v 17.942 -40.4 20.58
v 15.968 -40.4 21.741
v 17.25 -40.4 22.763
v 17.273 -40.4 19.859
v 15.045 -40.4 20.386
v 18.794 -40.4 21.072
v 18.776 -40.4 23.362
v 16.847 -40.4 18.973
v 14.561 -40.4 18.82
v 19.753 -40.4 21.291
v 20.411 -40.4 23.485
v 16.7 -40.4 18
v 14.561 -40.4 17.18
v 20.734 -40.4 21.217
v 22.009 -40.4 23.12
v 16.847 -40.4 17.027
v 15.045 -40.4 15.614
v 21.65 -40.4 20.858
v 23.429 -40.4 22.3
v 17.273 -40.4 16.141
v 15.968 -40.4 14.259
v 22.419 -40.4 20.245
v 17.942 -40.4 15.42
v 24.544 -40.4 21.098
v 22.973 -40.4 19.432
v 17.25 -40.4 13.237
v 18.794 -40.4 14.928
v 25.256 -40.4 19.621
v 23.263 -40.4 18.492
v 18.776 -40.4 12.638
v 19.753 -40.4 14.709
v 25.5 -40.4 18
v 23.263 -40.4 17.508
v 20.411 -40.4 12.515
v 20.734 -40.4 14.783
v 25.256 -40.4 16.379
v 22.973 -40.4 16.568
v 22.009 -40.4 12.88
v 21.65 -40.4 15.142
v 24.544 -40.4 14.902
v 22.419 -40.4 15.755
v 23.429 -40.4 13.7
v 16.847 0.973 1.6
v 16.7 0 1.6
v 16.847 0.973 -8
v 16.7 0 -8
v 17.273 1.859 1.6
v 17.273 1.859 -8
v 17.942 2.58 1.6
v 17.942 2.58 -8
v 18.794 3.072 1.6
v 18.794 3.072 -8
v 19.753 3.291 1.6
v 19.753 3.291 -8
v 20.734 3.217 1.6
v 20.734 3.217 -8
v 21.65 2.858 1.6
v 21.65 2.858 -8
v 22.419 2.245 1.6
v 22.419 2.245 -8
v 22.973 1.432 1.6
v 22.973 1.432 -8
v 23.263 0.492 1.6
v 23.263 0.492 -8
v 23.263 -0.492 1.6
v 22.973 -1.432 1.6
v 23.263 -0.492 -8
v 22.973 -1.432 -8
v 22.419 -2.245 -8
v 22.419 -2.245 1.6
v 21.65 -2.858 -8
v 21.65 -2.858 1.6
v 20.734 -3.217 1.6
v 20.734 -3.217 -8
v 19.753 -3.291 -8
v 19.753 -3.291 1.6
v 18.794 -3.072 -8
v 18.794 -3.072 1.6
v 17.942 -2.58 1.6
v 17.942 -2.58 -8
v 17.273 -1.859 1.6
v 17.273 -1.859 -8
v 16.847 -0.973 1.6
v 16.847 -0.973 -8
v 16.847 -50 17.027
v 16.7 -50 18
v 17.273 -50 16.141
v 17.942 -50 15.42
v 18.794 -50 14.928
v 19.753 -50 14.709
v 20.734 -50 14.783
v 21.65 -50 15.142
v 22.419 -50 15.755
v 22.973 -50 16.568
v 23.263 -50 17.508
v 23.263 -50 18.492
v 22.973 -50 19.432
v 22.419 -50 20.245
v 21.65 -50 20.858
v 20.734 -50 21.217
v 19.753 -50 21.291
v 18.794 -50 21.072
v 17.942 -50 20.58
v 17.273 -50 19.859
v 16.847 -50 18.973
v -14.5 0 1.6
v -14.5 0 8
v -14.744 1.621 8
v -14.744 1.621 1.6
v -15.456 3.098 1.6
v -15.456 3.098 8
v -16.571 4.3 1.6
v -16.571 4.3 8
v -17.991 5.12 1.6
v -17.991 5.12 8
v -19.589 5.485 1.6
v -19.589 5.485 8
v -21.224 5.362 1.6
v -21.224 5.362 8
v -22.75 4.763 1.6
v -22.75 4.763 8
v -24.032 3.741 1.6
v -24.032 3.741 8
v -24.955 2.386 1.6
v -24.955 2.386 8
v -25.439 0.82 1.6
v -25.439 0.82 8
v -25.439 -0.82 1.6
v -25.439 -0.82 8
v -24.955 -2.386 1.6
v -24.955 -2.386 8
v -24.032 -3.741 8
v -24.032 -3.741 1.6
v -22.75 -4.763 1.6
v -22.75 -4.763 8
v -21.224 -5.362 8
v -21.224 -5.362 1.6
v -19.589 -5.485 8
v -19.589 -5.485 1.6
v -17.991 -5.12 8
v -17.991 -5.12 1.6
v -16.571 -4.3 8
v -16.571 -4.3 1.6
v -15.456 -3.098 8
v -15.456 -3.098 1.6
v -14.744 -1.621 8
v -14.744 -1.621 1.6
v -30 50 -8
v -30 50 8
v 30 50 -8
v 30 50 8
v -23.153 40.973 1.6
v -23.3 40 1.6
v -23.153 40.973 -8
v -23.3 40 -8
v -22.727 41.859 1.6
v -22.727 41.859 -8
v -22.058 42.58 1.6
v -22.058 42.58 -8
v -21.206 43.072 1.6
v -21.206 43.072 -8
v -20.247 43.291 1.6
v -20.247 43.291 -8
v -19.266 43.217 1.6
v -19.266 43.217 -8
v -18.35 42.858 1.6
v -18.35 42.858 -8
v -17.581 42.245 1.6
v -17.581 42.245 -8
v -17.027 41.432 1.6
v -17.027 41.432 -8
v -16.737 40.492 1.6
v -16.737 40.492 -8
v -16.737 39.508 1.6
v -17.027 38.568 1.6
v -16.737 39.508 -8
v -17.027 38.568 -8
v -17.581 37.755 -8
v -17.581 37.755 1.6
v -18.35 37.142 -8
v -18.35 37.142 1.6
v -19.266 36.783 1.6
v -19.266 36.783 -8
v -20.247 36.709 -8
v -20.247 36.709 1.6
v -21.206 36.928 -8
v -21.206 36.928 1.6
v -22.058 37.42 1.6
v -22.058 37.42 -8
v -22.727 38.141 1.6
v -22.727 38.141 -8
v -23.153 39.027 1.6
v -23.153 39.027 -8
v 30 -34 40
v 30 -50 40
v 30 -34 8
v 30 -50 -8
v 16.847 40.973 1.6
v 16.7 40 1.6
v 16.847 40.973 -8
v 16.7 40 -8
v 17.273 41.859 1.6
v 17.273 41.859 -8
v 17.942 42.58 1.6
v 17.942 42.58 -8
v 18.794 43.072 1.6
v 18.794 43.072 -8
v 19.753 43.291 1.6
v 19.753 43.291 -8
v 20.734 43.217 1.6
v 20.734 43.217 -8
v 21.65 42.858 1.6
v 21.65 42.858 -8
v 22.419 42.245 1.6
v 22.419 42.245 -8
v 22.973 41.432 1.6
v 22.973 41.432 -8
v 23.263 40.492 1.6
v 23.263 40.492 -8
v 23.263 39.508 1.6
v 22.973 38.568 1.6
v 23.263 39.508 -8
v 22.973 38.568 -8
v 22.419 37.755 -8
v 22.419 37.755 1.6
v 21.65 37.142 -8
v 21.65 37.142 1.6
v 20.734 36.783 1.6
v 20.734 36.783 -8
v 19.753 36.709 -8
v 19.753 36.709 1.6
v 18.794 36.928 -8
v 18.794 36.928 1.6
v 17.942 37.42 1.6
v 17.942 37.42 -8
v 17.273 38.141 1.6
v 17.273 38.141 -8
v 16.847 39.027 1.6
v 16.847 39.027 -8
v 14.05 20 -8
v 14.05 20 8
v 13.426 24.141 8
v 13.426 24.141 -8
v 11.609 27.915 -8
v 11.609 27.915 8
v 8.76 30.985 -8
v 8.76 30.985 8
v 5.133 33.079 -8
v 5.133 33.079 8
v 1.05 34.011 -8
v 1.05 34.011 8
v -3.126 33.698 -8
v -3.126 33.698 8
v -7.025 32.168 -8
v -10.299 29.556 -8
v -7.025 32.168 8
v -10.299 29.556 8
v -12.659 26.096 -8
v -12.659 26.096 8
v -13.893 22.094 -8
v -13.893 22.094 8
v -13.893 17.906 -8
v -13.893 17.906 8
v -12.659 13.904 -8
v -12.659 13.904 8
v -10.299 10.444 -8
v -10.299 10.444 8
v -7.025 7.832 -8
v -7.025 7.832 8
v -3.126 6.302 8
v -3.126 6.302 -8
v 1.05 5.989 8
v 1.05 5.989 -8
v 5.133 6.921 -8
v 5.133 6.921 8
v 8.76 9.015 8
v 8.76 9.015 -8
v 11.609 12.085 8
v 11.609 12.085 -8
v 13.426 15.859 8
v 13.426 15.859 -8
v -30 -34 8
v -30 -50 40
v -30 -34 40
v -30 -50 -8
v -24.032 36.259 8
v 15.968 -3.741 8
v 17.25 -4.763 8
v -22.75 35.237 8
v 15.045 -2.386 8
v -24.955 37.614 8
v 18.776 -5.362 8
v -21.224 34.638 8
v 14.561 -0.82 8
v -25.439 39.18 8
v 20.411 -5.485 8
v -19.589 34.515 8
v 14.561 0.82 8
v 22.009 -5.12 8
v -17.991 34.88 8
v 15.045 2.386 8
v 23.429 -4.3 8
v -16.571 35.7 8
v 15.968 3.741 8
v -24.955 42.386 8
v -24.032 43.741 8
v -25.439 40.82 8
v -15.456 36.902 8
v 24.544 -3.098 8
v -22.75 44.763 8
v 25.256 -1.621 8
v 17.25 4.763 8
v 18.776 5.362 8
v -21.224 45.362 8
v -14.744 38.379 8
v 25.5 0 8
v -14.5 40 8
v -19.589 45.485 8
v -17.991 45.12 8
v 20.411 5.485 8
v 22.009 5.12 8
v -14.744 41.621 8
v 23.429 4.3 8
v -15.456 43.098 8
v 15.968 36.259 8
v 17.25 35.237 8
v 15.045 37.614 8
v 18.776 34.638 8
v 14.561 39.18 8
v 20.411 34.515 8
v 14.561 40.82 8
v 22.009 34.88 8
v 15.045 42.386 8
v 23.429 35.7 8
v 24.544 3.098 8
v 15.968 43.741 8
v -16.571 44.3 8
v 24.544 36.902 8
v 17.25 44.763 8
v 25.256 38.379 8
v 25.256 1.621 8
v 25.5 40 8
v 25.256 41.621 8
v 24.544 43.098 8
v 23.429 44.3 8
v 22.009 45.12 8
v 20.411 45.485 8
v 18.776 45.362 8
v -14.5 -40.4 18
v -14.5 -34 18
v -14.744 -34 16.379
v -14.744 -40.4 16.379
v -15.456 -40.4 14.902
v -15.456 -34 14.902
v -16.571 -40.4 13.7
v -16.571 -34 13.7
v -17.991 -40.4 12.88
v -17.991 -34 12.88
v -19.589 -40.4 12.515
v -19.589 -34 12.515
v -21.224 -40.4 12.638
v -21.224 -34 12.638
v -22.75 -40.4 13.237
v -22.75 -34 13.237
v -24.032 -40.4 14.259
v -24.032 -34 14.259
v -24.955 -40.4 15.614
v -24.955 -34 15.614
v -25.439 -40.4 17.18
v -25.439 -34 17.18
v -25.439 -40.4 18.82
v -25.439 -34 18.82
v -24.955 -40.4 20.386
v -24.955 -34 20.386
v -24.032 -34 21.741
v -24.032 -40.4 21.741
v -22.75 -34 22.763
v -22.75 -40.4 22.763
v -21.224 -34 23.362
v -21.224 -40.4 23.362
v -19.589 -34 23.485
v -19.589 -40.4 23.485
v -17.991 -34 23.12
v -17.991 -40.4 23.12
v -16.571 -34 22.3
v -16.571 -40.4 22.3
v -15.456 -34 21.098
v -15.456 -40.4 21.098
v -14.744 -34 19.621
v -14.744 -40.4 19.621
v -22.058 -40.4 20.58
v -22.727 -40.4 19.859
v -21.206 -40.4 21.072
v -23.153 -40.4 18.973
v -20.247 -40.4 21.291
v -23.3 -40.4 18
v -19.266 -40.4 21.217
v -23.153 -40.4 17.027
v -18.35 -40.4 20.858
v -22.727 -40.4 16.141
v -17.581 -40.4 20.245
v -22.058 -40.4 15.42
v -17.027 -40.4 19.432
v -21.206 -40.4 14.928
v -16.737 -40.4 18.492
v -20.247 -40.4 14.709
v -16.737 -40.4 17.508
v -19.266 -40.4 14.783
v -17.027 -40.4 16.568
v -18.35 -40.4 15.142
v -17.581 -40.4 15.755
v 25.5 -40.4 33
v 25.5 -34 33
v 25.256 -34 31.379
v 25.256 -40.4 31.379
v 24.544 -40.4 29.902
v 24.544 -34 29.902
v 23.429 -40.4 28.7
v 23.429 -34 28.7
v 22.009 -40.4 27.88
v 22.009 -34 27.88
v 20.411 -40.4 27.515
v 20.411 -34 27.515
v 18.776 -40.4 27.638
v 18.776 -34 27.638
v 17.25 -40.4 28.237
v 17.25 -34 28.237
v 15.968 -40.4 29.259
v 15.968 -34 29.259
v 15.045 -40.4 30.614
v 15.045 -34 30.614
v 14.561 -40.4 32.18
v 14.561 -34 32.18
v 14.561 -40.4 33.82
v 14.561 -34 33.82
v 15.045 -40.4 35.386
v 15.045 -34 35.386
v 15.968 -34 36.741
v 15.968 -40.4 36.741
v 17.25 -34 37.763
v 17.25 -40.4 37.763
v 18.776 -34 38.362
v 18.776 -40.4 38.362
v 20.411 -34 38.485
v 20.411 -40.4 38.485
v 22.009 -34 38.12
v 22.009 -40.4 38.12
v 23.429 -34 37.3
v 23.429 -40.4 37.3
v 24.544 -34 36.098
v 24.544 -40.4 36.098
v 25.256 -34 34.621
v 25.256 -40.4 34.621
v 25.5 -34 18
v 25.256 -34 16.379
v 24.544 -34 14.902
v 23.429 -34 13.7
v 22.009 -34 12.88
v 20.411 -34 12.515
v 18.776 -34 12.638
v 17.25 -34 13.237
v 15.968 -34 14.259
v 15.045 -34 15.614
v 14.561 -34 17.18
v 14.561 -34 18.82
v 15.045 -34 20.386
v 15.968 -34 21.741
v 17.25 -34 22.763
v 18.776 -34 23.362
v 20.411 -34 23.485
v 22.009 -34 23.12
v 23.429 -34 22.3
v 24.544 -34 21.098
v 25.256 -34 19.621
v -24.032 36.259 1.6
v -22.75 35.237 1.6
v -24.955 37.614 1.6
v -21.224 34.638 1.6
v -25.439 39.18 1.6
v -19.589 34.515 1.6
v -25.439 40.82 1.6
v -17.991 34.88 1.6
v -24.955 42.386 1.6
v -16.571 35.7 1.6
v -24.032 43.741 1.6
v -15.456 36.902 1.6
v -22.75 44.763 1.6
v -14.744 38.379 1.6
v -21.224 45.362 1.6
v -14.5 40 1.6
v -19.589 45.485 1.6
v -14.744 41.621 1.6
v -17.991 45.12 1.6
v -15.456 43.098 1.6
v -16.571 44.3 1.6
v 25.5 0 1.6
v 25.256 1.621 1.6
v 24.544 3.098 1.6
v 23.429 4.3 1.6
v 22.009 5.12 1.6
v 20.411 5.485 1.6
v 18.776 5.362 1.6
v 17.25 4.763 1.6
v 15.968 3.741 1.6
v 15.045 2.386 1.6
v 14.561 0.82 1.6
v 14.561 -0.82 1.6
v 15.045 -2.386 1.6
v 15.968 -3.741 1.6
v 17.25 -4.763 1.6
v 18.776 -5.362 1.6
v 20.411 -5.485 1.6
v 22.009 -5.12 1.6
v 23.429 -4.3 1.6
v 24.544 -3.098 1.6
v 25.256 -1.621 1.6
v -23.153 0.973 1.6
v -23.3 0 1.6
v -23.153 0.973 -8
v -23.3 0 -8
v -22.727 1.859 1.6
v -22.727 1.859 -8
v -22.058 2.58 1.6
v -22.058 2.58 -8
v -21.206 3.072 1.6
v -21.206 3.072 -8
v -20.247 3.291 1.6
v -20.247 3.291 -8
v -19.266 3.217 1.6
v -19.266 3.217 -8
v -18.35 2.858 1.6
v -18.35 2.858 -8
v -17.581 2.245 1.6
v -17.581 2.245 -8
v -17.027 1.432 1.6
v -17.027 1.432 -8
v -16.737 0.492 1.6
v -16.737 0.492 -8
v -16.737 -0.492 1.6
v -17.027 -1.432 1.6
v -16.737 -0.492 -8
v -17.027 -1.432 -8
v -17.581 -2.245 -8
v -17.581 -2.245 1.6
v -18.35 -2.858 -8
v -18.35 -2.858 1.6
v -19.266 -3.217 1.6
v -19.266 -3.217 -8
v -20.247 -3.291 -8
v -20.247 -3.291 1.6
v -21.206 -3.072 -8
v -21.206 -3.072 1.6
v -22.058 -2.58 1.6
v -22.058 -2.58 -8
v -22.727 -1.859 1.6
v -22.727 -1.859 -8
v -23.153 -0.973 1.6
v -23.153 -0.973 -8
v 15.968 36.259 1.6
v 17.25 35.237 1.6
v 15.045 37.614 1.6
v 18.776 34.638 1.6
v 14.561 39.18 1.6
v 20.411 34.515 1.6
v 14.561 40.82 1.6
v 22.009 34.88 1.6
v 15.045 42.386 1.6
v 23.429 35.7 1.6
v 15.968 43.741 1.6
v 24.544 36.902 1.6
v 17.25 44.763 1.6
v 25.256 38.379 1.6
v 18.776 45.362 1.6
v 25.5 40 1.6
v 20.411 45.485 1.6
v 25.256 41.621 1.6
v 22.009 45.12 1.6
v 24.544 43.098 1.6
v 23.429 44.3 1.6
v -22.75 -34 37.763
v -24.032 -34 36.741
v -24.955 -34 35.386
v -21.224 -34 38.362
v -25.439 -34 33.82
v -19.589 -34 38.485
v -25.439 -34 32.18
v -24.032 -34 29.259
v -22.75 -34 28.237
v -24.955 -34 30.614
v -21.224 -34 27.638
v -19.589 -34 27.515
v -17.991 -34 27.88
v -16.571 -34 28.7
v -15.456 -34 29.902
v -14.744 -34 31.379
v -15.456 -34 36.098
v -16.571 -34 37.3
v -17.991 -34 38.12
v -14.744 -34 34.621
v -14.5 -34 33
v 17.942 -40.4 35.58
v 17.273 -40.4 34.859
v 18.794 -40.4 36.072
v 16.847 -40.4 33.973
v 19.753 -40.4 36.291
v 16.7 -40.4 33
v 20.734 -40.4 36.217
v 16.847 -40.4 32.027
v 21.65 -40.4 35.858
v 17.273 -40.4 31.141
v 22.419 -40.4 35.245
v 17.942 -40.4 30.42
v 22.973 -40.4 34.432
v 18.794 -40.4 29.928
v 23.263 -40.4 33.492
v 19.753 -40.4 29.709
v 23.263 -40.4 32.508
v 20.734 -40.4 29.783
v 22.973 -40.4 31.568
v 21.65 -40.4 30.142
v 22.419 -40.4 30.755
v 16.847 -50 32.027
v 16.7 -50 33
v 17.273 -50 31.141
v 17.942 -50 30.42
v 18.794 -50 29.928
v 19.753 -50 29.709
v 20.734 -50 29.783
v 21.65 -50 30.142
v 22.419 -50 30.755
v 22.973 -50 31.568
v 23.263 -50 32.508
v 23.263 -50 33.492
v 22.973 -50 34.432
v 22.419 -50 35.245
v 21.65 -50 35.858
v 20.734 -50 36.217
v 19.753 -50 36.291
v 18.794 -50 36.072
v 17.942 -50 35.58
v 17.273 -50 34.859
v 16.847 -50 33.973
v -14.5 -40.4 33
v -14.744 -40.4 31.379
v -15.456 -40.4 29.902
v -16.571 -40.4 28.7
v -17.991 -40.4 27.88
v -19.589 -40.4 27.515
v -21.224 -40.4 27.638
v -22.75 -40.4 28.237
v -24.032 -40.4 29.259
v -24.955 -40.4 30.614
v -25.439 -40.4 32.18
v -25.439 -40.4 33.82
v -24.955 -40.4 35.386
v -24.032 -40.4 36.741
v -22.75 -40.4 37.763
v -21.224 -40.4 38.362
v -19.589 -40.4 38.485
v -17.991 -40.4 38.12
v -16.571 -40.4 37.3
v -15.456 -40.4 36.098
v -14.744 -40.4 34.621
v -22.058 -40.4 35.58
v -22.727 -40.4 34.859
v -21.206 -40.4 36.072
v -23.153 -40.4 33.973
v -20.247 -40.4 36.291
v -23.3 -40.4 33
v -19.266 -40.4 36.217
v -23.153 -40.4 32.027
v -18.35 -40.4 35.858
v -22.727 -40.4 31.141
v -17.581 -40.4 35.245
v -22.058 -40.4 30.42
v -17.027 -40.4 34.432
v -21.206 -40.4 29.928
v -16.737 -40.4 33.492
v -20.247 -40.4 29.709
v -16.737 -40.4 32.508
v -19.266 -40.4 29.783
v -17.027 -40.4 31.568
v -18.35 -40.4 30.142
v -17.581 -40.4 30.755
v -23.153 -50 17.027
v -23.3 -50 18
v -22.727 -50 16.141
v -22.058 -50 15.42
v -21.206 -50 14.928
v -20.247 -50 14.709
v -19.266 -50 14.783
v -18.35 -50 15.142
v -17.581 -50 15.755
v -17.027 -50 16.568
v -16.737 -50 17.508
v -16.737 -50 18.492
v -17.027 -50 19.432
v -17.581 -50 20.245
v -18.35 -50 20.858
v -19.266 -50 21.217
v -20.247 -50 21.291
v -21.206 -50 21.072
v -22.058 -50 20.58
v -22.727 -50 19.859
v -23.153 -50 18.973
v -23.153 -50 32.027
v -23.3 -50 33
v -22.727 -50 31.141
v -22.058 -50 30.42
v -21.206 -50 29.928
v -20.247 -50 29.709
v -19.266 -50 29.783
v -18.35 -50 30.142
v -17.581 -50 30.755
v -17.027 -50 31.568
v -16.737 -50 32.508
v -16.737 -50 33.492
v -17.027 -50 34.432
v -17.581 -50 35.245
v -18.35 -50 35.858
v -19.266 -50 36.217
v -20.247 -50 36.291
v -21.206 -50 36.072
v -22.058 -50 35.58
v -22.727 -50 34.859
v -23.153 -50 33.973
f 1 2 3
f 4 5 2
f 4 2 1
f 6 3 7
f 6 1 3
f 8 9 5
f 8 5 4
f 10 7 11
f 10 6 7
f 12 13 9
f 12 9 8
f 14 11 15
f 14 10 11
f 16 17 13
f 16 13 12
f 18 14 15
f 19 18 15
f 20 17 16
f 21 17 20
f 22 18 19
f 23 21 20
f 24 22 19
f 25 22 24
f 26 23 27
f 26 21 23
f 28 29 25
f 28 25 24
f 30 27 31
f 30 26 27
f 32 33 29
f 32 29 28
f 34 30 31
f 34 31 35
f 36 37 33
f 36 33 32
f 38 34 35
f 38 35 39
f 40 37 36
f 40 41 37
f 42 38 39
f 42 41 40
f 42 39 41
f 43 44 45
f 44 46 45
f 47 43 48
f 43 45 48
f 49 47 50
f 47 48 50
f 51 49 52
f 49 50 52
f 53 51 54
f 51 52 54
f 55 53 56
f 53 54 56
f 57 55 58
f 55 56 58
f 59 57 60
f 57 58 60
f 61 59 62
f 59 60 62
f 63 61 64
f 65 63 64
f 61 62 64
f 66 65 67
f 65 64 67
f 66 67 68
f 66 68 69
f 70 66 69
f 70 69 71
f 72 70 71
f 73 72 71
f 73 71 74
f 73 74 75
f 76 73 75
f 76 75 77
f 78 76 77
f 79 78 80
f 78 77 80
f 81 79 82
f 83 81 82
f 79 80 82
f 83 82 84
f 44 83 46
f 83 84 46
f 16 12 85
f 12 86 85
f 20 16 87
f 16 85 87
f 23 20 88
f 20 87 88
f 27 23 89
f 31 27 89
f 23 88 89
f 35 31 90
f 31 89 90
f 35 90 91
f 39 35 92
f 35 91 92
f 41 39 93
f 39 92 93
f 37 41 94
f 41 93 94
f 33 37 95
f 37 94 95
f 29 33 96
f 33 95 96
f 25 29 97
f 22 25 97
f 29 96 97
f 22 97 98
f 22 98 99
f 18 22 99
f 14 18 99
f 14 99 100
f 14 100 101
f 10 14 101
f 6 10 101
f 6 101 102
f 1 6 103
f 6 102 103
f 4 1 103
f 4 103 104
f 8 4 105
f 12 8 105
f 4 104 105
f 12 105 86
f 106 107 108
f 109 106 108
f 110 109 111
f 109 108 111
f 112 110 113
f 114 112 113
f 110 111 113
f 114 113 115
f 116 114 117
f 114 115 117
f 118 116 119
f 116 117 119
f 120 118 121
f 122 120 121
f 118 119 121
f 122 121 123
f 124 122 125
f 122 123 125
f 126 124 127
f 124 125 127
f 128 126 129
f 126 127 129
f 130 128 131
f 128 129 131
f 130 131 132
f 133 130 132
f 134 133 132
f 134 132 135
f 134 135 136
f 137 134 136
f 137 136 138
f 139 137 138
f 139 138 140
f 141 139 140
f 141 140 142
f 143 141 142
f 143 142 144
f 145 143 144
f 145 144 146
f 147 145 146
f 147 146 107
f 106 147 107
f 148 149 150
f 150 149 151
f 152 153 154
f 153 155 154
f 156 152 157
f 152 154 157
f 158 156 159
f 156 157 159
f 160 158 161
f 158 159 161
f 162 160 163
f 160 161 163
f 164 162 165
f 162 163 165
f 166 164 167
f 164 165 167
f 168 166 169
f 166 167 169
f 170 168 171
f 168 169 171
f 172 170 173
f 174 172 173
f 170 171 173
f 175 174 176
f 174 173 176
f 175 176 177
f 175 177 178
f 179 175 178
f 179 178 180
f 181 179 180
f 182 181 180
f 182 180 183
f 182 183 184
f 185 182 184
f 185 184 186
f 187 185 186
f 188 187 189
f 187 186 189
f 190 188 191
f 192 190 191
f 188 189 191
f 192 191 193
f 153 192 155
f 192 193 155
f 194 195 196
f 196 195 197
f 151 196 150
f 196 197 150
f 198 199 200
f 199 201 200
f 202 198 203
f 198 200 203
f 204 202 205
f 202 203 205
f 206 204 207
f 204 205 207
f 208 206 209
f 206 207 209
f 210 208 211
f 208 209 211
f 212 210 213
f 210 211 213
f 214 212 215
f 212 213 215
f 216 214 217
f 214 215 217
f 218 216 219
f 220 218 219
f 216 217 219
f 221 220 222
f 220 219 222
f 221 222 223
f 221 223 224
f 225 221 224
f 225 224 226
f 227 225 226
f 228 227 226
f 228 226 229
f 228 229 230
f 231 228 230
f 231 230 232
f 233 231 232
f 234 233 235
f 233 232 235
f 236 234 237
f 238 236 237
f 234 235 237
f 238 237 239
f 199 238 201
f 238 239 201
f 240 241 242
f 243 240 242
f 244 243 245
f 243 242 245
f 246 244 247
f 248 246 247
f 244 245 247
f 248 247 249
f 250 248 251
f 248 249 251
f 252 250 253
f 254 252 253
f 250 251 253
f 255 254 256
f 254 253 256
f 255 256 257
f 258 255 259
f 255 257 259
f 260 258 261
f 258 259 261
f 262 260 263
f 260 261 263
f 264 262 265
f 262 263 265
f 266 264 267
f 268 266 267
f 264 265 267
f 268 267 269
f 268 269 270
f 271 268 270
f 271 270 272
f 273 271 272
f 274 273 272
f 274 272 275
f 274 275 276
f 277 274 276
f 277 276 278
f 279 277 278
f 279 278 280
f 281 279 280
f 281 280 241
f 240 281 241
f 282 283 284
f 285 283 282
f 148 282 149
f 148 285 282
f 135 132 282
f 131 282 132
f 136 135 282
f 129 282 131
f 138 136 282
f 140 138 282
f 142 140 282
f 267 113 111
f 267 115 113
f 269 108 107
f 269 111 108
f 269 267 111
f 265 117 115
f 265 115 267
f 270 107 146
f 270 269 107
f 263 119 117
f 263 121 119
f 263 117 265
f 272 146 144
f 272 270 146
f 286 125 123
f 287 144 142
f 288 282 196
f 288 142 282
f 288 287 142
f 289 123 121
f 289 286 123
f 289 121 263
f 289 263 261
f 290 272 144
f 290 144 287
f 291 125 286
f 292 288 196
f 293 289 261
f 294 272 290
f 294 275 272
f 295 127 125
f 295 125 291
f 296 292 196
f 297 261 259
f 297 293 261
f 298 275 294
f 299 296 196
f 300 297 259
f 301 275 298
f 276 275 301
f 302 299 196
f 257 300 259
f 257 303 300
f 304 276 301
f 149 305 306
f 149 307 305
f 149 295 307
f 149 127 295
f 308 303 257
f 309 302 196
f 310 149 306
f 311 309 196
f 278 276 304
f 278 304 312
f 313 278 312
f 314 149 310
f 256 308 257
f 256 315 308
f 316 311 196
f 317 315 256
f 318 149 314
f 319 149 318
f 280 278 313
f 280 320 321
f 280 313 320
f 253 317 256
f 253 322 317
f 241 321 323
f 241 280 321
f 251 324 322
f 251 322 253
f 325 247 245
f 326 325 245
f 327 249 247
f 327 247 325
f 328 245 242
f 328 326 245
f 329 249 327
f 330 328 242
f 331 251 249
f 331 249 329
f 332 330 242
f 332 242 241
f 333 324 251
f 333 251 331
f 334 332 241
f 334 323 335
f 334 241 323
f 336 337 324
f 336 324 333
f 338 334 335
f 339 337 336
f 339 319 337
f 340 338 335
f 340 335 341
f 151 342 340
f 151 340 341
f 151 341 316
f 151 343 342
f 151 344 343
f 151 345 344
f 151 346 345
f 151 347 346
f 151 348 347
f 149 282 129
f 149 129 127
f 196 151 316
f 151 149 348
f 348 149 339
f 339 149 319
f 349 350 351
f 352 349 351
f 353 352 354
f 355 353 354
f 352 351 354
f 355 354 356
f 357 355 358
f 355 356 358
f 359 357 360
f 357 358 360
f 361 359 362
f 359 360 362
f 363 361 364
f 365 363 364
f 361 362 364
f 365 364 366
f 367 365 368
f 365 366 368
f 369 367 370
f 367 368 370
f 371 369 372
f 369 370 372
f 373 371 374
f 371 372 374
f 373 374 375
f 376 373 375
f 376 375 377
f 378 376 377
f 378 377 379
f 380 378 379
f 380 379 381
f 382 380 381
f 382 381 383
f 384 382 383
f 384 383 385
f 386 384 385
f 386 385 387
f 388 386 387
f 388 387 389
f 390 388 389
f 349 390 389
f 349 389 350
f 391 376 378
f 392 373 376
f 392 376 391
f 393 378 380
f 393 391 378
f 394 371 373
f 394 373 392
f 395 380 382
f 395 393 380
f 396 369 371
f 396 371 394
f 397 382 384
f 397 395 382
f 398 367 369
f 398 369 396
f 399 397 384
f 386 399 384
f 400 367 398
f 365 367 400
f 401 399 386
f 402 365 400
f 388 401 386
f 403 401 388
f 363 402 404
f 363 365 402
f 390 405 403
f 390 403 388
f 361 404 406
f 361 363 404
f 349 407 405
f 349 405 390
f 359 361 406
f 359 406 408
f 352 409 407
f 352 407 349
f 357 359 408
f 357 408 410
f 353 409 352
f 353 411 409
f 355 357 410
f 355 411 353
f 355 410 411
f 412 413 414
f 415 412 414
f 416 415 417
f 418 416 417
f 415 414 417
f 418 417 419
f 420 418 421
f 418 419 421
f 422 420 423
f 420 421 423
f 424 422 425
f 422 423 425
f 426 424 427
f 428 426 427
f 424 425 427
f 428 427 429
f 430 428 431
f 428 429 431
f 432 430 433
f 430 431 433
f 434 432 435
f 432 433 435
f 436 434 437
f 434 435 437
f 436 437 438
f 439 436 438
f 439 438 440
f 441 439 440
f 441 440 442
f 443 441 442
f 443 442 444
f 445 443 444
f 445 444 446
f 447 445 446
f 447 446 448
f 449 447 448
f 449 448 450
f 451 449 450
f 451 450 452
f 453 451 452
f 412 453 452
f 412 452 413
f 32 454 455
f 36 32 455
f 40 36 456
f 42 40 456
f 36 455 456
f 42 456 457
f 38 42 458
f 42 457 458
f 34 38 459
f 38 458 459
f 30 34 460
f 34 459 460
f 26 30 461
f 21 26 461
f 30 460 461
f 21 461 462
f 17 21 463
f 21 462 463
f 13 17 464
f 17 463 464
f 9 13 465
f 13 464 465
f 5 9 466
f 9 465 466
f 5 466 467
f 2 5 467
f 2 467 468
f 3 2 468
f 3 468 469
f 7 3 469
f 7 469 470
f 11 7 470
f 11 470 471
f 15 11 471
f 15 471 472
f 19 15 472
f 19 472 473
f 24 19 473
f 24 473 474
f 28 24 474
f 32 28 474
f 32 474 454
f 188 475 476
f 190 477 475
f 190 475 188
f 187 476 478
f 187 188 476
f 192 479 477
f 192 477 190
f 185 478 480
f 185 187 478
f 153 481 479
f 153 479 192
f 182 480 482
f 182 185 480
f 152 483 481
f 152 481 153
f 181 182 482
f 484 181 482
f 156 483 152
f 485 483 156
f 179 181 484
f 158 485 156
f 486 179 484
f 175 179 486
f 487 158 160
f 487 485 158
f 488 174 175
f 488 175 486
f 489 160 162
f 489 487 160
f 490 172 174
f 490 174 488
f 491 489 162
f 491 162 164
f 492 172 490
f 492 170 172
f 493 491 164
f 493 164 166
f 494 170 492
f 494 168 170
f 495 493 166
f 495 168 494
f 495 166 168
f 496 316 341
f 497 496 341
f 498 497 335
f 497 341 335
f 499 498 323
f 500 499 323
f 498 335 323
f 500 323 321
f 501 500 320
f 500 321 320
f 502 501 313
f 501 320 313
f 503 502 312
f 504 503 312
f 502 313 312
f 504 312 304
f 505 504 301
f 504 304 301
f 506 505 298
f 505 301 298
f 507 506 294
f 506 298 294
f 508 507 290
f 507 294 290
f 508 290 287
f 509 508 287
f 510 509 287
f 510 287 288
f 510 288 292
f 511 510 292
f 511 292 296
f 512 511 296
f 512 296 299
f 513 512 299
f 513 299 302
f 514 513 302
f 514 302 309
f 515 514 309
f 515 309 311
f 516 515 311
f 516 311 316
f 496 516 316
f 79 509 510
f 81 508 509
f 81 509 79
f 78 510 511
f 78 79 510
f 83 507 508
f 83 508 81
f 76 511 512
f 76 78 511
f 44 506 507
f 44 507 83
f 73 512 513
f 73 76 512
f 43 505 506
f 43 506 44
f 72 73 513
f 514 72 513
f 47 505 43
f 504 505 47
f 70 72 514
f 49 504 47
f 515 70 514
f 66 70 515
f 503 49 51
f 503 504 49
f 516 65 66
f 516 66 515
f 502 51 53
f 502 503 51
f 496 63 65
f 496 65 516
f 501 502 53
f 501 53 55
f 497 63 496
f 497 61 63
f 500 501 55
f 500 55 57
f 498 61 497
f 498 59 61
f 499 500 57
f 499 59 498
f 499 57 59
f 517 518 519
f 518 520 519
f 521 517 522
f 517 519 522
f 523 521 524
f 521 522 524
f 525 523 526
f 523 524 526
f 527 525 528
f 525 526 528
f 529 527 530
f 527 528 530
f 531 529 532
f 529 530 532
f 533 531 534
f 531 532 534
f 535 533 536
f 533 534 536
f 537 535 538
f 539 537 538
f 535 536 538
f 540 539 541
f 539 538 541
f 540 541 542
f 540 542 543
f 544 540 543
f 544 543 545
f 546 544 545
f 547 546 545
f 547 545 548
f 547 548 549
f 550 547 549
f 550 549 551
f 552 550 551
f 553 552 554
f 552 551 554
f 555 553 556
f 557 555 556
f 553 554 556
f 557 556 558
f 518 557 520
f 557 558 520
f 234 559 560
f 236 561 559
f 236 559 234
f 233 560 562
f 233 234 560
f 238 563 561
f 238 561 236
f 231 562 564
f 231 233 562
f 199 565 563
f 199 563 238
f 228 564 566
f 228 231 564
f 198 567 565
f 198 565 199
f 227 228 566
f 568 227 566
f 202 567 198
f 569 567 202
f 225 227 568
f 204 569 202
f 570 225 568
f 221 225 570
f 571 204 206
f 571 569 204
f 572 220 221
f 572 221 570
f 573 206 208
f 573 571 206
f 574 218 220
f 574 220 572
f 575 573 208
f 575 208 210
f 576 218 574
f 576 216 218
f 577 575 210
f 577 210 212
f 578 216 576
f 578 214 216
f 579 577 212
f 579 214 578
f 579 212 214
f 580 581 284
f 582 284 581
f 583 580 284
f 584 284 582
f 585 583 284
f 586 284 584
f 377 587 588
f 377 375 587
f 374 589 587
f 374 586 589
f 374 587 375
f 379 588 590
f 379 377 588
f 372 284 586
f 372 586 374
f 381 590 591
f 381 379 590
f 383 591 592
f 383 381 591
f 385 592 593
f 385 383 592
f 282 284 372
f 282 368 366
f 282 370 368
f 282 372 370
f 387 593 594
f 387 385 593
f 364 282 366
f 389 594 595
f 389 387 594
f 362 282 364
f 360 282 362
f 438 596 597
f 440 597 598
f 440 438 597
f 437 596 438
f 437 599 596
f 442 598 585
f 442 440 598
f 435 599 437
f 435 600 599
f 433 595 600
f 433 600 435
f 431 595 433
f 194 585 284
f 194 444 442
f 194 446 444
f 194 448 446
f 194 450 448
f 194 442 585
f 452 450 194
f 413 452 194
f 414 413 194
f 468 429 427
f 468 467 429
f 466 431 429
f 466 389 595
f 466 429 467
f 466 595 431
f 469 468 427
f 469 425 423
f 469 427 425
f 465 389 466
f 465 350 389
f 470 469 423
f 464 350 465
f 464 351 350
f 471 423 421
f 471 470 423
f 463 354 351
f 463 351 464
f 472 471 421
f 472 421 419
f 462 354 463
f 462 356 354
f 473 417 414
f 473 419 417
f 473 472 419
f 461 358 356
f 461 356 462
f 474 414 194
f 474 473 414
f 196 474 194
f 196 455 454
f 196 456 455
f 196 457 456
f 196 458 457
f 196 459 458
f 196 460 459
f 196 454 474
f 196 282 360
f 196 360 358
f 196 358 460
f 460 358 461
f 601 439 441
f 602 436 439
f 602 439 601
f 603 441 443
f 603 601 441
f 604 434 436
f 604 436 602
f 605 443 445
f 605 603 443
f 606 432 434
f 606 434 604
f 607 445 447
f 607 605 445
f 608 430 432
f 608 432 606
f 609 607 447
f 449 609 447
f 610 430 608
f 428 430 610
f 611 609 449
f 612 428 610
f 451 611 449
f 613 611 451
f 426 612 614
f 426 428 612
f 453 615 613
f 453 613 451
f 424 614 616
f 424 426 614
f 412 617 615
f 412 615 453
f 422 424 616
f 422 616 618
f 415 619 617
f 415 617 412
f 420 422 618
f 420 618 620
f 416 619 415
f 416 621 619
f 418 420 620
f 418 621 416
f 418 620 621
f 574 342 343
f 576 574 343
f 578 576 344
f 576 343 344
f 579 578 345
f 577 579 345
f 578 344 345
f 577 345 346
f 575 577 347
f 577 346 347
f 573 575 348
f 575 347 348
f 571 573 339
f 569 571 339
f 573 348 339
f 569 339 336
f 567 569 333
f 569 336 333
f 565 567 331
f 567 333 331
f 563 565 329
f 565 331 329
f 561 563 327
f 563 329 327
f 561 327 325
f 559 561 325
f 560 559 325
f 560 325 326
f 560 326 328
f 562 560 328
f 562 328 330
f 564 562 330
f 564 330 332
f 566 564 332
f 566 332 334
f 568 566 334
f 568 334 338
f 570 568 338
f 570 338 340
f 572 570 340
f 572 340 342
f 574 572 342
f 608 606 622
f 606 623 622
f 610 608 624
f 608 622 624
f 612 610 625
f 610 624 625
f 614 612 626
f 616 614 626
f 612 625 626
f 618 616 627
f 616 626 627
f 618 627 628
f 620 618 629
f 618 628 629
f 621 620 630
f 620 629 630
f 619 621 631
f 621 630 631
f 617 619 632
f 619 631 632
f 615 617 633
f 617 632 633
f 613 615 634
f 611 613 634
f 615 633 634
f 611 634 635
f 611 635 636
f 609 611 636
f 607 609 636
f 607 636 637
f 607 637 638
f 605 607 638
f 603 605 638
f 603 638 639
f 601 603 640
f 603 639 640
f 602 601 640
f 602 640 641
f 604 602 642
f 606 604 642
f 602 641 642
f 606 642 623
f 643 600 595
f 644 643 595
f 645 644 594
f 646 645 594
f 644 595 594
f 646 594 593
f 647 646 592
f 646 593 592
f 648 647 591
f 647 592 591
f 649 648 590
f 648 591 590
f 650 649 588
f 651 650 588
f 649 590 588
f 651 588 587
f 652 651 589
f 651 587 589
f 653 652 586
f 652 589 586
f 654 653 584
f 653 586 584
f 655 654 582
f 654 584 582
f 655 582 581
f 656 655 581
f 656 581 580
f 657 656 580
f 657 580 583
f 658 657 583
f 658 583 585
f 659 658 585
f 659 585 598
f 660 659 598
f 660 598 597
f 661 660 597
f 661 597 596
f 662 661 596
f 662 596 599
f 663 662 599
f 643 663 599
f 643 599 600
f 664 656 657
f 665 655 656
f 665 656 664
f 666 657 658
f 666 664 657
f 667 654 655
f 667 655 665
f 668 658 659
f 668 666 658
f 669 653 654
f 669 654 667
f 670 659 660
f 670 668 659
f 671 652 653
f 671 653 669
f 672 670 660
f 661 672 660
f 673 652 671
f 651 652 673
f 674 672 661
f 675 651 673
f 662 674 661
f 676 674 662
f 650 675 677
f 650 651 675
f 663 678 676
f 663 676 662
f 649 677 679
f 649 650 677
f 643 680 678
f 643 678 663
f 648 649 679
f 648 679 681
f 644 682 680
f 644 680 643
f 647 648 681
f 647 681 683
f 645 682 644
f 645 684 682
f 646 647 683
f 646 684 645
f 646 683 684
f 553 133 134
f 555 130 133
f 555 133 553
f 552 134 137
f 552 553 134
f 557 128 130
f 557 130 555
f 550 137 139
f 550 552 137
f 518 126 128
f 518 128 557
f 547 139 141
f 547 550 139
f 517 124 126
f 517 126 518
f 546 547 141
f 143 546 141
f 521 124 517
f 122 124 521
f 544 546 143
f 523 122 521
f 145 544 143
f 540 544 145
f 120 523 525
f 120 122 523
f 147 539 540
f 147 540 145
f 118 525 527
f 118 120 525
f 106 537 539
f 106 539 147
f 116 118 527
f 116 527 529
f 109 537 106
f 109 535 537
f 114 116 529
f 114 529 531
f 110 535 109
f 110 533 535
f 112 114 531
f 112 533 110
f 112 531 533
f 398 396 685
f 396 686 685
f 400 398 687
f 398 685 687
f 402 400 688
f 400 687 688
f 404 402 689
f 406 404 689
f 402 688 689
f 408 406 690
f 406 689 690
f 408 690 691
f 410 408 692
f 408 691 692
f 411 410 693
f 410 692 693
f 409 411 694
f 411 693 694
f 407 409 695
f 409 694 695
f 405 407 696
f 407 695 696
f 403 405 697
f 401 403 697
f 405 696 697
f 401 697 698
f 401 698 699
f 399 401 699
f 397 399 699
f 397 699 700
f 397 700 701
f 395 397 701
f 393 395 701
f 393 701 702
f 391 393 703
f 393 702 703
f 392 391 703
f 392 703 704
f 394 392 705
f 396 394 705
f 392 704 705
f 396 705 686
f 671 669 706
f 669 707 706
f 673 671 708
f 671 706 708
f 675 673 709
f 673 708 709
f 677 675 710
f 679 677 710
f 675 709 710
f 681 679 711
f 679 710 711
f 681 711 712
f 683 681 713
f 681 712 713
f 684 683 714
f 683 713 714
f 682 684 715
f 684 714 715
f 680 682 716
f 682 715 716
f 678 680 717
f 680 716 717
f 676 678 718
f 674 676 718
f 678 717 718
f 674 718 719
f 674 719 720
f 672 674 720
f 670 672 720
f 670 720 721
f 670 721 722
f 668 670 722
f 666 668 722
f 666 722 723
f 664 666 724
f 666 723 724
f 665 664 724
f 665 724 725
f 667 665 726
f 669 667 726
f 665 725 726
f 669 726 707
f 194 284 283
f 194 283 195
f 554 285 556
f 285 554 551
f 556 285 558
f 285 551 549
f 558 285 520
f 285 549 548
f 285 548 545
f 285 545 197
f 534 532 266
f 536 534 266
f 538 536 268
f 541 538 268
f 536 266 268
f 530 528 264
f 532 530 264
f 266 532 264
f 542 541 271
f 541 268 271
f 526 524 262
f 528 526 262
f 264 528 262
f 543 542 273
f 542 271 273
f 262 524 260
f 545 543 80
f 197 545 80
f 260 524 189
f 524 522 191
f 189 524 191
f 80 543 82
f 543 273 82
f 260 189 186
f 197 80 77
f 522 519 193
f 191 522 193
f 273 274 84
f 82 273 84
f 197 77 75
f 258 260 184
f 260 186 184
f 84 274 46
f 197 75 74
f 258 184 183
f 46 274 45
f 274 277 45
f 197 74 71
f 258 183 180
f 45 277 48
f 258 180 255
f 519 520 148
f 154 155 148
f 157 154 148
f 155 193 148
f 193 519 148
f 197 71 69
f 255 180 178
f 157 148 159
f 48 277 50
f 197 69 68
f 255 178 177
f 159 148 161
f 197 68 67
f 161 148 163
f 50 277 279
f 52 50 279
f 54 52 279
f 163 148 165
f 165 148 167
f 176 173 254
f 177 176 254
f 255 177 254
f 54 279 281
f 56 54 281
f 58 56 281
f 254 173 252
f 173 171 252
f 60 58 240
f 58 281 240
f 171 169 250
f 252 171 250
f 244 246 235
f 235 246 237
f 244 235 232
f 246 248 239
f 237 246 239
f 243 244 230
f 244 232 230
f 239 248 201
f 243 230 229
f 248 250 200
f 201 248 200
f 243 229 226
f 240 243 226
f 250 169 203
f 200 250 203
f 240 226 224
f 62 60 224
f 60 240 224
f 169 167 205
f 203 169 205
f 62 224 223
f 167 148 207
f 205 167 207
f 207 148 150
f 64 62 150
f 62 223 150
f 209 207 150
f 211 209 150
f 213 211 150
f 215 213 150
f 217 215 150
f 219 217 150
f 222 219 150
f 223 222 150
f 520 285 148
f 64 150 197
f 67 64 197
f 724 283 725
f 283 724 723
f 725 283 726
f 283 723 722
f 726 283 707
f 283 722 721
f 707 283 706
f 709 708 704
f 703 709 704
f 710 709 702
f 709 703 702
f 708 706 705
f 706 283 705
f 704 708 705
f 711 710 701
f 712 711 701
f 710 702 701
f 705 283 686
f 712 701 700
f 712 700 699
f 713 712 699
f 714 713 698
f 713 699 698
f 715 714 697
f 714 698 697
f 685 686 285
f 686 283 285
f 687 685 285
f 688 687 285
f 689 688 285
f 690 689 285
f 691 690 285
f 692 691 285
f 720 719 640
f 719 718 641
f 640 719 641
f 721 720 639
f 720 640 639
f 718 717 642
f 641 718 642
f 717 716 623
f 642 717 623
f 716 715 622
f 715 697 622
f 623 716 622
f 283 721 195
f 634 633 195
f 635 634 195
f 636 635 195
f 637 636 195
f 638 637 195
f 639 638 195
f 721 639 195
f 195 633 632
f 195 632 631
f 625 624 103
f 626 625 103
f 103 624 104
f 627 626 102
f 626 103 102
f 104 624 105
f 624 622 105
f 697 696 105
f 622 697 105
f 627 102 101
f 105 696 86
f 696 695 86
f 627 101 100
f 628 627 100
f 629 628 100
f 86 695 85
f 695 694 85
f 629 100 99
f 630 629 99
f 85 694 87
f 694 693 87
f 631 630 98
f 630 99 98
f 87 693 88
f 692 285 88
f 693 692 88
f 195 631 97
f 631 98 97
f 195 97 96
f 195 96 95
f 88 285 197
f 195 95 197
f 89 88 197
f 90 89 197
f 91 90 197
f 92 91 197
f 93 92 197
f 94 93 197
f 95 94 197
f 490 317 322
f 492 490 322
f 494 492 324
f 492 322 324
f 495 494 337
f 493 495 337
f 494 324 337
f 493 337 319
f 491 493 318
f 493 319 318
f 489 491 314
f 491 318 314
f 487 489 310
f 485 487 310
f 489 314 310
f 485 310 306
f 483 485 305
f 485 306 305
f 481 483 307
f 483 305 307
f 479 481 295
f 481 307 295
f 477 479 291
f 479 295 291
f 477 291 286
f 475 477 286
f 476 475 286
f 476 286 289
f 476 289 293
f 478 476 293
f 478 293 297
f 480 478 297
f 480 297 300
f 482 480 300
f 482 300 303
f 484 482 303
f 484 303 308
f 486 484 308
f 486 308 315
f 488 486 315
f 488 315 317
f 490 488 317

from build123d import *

# Parameters (mm, degrees)
SKETCH1_W                                           = 60
SKETCH1_H                                           = 100
BOSS_EXTRUDE1_DEPTH                                 = 8
CBORE_FOR_M6_HEX_SOCKET_HEAD_CAP_SCREW1_D           = 6.6
CBORE_FOR_M6_HEX_SOCKET_HEAD_CAP_SCREW1_CBORE_D     = 11
CBORE_FOR_M6_HEX_SOCKET_HEAD_CAP_SCREW1_CBORE_DEPTH = 6.4
SKETCH6_R                                           = 14.05
CUT_EXTRUDE1_DEPTH                                  = 61.464865831
SKETCH7_W                                           = 60
SKETCH7_H                                           = 16
BOSS_EXTRUDE2_DEPTH                                 = 32
CBORE_FOR_M6_HEX_SOCKET_HEAD_CAP_SCREW2_D           = 6.6
CBORE_FOR_M6_HEX_SOCKET_HEAD_CAP_SCREW2_CBORE_D     = 11
CBORE_FOR_M6_HEX_SOCKET_HEAD_CAP_SCREW2_CBORE_DEPTH = 6.4


with BuildPart() as part:
    # Sketch1 → Boss-Extrude1 (new, symmetric)
    with BuildSketch(Plane.XY):
        Rectangle(SKETCH1_W, SKETCH1_H)
    extrude(amount=BOSS_EXTRUDE1_DEPTH, both=True)

    # CBORE for M6 Hex Socket Head Cap Screw1 (through all)
    with Locations(Plane.XY.offset(8)):
        with Locations((-20, 40), (20, 40), (20, 0), (-20, 0)):
            CounterBoreHole(CBORE_FOR_M6_HEX_SOCKET_HEAD_CAP_SCREW1_D / 2, CBORE_FOR_M6_HEX_SOCKET_HEAD_CAP_SCREW1_CBORE_D / 2, CBORE_FOR_M6_HEX_SOCKET_HEAD_CAP_SCREW1_CBORE_DEPTH)

    # Sketch6 → Cut-Extrude1 (cut, through all)
    with BuildSketch(Plane.XY.offset(8)):
        with Locations((0, 20)):
            Circle(SKETCH6_R)
    extrude(amount=-CUT_EXTRUDE1_DEPTH, mode=Mode.SUBTRACT)

    # Sketch7 → Boss-Extrude2 (add)
    with BuildSketch(Plane.XY.offset(8)):
        with Locations((0, -42)):
            Rectangle(SKETCH7_W, SKETCH7_H)
    extrude(amount=BOSS_EXTRUDE2_DEPTH)

    # CBORE for M6 Hex Socket Head Cap Screw2 (through all)
    with Locations(Plane(origin=(0, -34, 0), x_dir=(1, 0, 0), z_dir=(0, 1, 0))):
        with Locations((-20, -18), (20, -18), (20, -33), (-20, -33)):
            CounterBoreHole(CBORE_FOR_M6_HEX_SOCKET_HEAD_CAP_SCREW2_D / 2, CBORE_FOR_M6_HEX_SOCKET_HEAD_CAP_SCREW2_CBORE_D / 2, CBORE_FOR_M6_HEX_SOCKET_HEAD_CAP_SCREW2_CBORE_DEPTH)


solid = part.part
